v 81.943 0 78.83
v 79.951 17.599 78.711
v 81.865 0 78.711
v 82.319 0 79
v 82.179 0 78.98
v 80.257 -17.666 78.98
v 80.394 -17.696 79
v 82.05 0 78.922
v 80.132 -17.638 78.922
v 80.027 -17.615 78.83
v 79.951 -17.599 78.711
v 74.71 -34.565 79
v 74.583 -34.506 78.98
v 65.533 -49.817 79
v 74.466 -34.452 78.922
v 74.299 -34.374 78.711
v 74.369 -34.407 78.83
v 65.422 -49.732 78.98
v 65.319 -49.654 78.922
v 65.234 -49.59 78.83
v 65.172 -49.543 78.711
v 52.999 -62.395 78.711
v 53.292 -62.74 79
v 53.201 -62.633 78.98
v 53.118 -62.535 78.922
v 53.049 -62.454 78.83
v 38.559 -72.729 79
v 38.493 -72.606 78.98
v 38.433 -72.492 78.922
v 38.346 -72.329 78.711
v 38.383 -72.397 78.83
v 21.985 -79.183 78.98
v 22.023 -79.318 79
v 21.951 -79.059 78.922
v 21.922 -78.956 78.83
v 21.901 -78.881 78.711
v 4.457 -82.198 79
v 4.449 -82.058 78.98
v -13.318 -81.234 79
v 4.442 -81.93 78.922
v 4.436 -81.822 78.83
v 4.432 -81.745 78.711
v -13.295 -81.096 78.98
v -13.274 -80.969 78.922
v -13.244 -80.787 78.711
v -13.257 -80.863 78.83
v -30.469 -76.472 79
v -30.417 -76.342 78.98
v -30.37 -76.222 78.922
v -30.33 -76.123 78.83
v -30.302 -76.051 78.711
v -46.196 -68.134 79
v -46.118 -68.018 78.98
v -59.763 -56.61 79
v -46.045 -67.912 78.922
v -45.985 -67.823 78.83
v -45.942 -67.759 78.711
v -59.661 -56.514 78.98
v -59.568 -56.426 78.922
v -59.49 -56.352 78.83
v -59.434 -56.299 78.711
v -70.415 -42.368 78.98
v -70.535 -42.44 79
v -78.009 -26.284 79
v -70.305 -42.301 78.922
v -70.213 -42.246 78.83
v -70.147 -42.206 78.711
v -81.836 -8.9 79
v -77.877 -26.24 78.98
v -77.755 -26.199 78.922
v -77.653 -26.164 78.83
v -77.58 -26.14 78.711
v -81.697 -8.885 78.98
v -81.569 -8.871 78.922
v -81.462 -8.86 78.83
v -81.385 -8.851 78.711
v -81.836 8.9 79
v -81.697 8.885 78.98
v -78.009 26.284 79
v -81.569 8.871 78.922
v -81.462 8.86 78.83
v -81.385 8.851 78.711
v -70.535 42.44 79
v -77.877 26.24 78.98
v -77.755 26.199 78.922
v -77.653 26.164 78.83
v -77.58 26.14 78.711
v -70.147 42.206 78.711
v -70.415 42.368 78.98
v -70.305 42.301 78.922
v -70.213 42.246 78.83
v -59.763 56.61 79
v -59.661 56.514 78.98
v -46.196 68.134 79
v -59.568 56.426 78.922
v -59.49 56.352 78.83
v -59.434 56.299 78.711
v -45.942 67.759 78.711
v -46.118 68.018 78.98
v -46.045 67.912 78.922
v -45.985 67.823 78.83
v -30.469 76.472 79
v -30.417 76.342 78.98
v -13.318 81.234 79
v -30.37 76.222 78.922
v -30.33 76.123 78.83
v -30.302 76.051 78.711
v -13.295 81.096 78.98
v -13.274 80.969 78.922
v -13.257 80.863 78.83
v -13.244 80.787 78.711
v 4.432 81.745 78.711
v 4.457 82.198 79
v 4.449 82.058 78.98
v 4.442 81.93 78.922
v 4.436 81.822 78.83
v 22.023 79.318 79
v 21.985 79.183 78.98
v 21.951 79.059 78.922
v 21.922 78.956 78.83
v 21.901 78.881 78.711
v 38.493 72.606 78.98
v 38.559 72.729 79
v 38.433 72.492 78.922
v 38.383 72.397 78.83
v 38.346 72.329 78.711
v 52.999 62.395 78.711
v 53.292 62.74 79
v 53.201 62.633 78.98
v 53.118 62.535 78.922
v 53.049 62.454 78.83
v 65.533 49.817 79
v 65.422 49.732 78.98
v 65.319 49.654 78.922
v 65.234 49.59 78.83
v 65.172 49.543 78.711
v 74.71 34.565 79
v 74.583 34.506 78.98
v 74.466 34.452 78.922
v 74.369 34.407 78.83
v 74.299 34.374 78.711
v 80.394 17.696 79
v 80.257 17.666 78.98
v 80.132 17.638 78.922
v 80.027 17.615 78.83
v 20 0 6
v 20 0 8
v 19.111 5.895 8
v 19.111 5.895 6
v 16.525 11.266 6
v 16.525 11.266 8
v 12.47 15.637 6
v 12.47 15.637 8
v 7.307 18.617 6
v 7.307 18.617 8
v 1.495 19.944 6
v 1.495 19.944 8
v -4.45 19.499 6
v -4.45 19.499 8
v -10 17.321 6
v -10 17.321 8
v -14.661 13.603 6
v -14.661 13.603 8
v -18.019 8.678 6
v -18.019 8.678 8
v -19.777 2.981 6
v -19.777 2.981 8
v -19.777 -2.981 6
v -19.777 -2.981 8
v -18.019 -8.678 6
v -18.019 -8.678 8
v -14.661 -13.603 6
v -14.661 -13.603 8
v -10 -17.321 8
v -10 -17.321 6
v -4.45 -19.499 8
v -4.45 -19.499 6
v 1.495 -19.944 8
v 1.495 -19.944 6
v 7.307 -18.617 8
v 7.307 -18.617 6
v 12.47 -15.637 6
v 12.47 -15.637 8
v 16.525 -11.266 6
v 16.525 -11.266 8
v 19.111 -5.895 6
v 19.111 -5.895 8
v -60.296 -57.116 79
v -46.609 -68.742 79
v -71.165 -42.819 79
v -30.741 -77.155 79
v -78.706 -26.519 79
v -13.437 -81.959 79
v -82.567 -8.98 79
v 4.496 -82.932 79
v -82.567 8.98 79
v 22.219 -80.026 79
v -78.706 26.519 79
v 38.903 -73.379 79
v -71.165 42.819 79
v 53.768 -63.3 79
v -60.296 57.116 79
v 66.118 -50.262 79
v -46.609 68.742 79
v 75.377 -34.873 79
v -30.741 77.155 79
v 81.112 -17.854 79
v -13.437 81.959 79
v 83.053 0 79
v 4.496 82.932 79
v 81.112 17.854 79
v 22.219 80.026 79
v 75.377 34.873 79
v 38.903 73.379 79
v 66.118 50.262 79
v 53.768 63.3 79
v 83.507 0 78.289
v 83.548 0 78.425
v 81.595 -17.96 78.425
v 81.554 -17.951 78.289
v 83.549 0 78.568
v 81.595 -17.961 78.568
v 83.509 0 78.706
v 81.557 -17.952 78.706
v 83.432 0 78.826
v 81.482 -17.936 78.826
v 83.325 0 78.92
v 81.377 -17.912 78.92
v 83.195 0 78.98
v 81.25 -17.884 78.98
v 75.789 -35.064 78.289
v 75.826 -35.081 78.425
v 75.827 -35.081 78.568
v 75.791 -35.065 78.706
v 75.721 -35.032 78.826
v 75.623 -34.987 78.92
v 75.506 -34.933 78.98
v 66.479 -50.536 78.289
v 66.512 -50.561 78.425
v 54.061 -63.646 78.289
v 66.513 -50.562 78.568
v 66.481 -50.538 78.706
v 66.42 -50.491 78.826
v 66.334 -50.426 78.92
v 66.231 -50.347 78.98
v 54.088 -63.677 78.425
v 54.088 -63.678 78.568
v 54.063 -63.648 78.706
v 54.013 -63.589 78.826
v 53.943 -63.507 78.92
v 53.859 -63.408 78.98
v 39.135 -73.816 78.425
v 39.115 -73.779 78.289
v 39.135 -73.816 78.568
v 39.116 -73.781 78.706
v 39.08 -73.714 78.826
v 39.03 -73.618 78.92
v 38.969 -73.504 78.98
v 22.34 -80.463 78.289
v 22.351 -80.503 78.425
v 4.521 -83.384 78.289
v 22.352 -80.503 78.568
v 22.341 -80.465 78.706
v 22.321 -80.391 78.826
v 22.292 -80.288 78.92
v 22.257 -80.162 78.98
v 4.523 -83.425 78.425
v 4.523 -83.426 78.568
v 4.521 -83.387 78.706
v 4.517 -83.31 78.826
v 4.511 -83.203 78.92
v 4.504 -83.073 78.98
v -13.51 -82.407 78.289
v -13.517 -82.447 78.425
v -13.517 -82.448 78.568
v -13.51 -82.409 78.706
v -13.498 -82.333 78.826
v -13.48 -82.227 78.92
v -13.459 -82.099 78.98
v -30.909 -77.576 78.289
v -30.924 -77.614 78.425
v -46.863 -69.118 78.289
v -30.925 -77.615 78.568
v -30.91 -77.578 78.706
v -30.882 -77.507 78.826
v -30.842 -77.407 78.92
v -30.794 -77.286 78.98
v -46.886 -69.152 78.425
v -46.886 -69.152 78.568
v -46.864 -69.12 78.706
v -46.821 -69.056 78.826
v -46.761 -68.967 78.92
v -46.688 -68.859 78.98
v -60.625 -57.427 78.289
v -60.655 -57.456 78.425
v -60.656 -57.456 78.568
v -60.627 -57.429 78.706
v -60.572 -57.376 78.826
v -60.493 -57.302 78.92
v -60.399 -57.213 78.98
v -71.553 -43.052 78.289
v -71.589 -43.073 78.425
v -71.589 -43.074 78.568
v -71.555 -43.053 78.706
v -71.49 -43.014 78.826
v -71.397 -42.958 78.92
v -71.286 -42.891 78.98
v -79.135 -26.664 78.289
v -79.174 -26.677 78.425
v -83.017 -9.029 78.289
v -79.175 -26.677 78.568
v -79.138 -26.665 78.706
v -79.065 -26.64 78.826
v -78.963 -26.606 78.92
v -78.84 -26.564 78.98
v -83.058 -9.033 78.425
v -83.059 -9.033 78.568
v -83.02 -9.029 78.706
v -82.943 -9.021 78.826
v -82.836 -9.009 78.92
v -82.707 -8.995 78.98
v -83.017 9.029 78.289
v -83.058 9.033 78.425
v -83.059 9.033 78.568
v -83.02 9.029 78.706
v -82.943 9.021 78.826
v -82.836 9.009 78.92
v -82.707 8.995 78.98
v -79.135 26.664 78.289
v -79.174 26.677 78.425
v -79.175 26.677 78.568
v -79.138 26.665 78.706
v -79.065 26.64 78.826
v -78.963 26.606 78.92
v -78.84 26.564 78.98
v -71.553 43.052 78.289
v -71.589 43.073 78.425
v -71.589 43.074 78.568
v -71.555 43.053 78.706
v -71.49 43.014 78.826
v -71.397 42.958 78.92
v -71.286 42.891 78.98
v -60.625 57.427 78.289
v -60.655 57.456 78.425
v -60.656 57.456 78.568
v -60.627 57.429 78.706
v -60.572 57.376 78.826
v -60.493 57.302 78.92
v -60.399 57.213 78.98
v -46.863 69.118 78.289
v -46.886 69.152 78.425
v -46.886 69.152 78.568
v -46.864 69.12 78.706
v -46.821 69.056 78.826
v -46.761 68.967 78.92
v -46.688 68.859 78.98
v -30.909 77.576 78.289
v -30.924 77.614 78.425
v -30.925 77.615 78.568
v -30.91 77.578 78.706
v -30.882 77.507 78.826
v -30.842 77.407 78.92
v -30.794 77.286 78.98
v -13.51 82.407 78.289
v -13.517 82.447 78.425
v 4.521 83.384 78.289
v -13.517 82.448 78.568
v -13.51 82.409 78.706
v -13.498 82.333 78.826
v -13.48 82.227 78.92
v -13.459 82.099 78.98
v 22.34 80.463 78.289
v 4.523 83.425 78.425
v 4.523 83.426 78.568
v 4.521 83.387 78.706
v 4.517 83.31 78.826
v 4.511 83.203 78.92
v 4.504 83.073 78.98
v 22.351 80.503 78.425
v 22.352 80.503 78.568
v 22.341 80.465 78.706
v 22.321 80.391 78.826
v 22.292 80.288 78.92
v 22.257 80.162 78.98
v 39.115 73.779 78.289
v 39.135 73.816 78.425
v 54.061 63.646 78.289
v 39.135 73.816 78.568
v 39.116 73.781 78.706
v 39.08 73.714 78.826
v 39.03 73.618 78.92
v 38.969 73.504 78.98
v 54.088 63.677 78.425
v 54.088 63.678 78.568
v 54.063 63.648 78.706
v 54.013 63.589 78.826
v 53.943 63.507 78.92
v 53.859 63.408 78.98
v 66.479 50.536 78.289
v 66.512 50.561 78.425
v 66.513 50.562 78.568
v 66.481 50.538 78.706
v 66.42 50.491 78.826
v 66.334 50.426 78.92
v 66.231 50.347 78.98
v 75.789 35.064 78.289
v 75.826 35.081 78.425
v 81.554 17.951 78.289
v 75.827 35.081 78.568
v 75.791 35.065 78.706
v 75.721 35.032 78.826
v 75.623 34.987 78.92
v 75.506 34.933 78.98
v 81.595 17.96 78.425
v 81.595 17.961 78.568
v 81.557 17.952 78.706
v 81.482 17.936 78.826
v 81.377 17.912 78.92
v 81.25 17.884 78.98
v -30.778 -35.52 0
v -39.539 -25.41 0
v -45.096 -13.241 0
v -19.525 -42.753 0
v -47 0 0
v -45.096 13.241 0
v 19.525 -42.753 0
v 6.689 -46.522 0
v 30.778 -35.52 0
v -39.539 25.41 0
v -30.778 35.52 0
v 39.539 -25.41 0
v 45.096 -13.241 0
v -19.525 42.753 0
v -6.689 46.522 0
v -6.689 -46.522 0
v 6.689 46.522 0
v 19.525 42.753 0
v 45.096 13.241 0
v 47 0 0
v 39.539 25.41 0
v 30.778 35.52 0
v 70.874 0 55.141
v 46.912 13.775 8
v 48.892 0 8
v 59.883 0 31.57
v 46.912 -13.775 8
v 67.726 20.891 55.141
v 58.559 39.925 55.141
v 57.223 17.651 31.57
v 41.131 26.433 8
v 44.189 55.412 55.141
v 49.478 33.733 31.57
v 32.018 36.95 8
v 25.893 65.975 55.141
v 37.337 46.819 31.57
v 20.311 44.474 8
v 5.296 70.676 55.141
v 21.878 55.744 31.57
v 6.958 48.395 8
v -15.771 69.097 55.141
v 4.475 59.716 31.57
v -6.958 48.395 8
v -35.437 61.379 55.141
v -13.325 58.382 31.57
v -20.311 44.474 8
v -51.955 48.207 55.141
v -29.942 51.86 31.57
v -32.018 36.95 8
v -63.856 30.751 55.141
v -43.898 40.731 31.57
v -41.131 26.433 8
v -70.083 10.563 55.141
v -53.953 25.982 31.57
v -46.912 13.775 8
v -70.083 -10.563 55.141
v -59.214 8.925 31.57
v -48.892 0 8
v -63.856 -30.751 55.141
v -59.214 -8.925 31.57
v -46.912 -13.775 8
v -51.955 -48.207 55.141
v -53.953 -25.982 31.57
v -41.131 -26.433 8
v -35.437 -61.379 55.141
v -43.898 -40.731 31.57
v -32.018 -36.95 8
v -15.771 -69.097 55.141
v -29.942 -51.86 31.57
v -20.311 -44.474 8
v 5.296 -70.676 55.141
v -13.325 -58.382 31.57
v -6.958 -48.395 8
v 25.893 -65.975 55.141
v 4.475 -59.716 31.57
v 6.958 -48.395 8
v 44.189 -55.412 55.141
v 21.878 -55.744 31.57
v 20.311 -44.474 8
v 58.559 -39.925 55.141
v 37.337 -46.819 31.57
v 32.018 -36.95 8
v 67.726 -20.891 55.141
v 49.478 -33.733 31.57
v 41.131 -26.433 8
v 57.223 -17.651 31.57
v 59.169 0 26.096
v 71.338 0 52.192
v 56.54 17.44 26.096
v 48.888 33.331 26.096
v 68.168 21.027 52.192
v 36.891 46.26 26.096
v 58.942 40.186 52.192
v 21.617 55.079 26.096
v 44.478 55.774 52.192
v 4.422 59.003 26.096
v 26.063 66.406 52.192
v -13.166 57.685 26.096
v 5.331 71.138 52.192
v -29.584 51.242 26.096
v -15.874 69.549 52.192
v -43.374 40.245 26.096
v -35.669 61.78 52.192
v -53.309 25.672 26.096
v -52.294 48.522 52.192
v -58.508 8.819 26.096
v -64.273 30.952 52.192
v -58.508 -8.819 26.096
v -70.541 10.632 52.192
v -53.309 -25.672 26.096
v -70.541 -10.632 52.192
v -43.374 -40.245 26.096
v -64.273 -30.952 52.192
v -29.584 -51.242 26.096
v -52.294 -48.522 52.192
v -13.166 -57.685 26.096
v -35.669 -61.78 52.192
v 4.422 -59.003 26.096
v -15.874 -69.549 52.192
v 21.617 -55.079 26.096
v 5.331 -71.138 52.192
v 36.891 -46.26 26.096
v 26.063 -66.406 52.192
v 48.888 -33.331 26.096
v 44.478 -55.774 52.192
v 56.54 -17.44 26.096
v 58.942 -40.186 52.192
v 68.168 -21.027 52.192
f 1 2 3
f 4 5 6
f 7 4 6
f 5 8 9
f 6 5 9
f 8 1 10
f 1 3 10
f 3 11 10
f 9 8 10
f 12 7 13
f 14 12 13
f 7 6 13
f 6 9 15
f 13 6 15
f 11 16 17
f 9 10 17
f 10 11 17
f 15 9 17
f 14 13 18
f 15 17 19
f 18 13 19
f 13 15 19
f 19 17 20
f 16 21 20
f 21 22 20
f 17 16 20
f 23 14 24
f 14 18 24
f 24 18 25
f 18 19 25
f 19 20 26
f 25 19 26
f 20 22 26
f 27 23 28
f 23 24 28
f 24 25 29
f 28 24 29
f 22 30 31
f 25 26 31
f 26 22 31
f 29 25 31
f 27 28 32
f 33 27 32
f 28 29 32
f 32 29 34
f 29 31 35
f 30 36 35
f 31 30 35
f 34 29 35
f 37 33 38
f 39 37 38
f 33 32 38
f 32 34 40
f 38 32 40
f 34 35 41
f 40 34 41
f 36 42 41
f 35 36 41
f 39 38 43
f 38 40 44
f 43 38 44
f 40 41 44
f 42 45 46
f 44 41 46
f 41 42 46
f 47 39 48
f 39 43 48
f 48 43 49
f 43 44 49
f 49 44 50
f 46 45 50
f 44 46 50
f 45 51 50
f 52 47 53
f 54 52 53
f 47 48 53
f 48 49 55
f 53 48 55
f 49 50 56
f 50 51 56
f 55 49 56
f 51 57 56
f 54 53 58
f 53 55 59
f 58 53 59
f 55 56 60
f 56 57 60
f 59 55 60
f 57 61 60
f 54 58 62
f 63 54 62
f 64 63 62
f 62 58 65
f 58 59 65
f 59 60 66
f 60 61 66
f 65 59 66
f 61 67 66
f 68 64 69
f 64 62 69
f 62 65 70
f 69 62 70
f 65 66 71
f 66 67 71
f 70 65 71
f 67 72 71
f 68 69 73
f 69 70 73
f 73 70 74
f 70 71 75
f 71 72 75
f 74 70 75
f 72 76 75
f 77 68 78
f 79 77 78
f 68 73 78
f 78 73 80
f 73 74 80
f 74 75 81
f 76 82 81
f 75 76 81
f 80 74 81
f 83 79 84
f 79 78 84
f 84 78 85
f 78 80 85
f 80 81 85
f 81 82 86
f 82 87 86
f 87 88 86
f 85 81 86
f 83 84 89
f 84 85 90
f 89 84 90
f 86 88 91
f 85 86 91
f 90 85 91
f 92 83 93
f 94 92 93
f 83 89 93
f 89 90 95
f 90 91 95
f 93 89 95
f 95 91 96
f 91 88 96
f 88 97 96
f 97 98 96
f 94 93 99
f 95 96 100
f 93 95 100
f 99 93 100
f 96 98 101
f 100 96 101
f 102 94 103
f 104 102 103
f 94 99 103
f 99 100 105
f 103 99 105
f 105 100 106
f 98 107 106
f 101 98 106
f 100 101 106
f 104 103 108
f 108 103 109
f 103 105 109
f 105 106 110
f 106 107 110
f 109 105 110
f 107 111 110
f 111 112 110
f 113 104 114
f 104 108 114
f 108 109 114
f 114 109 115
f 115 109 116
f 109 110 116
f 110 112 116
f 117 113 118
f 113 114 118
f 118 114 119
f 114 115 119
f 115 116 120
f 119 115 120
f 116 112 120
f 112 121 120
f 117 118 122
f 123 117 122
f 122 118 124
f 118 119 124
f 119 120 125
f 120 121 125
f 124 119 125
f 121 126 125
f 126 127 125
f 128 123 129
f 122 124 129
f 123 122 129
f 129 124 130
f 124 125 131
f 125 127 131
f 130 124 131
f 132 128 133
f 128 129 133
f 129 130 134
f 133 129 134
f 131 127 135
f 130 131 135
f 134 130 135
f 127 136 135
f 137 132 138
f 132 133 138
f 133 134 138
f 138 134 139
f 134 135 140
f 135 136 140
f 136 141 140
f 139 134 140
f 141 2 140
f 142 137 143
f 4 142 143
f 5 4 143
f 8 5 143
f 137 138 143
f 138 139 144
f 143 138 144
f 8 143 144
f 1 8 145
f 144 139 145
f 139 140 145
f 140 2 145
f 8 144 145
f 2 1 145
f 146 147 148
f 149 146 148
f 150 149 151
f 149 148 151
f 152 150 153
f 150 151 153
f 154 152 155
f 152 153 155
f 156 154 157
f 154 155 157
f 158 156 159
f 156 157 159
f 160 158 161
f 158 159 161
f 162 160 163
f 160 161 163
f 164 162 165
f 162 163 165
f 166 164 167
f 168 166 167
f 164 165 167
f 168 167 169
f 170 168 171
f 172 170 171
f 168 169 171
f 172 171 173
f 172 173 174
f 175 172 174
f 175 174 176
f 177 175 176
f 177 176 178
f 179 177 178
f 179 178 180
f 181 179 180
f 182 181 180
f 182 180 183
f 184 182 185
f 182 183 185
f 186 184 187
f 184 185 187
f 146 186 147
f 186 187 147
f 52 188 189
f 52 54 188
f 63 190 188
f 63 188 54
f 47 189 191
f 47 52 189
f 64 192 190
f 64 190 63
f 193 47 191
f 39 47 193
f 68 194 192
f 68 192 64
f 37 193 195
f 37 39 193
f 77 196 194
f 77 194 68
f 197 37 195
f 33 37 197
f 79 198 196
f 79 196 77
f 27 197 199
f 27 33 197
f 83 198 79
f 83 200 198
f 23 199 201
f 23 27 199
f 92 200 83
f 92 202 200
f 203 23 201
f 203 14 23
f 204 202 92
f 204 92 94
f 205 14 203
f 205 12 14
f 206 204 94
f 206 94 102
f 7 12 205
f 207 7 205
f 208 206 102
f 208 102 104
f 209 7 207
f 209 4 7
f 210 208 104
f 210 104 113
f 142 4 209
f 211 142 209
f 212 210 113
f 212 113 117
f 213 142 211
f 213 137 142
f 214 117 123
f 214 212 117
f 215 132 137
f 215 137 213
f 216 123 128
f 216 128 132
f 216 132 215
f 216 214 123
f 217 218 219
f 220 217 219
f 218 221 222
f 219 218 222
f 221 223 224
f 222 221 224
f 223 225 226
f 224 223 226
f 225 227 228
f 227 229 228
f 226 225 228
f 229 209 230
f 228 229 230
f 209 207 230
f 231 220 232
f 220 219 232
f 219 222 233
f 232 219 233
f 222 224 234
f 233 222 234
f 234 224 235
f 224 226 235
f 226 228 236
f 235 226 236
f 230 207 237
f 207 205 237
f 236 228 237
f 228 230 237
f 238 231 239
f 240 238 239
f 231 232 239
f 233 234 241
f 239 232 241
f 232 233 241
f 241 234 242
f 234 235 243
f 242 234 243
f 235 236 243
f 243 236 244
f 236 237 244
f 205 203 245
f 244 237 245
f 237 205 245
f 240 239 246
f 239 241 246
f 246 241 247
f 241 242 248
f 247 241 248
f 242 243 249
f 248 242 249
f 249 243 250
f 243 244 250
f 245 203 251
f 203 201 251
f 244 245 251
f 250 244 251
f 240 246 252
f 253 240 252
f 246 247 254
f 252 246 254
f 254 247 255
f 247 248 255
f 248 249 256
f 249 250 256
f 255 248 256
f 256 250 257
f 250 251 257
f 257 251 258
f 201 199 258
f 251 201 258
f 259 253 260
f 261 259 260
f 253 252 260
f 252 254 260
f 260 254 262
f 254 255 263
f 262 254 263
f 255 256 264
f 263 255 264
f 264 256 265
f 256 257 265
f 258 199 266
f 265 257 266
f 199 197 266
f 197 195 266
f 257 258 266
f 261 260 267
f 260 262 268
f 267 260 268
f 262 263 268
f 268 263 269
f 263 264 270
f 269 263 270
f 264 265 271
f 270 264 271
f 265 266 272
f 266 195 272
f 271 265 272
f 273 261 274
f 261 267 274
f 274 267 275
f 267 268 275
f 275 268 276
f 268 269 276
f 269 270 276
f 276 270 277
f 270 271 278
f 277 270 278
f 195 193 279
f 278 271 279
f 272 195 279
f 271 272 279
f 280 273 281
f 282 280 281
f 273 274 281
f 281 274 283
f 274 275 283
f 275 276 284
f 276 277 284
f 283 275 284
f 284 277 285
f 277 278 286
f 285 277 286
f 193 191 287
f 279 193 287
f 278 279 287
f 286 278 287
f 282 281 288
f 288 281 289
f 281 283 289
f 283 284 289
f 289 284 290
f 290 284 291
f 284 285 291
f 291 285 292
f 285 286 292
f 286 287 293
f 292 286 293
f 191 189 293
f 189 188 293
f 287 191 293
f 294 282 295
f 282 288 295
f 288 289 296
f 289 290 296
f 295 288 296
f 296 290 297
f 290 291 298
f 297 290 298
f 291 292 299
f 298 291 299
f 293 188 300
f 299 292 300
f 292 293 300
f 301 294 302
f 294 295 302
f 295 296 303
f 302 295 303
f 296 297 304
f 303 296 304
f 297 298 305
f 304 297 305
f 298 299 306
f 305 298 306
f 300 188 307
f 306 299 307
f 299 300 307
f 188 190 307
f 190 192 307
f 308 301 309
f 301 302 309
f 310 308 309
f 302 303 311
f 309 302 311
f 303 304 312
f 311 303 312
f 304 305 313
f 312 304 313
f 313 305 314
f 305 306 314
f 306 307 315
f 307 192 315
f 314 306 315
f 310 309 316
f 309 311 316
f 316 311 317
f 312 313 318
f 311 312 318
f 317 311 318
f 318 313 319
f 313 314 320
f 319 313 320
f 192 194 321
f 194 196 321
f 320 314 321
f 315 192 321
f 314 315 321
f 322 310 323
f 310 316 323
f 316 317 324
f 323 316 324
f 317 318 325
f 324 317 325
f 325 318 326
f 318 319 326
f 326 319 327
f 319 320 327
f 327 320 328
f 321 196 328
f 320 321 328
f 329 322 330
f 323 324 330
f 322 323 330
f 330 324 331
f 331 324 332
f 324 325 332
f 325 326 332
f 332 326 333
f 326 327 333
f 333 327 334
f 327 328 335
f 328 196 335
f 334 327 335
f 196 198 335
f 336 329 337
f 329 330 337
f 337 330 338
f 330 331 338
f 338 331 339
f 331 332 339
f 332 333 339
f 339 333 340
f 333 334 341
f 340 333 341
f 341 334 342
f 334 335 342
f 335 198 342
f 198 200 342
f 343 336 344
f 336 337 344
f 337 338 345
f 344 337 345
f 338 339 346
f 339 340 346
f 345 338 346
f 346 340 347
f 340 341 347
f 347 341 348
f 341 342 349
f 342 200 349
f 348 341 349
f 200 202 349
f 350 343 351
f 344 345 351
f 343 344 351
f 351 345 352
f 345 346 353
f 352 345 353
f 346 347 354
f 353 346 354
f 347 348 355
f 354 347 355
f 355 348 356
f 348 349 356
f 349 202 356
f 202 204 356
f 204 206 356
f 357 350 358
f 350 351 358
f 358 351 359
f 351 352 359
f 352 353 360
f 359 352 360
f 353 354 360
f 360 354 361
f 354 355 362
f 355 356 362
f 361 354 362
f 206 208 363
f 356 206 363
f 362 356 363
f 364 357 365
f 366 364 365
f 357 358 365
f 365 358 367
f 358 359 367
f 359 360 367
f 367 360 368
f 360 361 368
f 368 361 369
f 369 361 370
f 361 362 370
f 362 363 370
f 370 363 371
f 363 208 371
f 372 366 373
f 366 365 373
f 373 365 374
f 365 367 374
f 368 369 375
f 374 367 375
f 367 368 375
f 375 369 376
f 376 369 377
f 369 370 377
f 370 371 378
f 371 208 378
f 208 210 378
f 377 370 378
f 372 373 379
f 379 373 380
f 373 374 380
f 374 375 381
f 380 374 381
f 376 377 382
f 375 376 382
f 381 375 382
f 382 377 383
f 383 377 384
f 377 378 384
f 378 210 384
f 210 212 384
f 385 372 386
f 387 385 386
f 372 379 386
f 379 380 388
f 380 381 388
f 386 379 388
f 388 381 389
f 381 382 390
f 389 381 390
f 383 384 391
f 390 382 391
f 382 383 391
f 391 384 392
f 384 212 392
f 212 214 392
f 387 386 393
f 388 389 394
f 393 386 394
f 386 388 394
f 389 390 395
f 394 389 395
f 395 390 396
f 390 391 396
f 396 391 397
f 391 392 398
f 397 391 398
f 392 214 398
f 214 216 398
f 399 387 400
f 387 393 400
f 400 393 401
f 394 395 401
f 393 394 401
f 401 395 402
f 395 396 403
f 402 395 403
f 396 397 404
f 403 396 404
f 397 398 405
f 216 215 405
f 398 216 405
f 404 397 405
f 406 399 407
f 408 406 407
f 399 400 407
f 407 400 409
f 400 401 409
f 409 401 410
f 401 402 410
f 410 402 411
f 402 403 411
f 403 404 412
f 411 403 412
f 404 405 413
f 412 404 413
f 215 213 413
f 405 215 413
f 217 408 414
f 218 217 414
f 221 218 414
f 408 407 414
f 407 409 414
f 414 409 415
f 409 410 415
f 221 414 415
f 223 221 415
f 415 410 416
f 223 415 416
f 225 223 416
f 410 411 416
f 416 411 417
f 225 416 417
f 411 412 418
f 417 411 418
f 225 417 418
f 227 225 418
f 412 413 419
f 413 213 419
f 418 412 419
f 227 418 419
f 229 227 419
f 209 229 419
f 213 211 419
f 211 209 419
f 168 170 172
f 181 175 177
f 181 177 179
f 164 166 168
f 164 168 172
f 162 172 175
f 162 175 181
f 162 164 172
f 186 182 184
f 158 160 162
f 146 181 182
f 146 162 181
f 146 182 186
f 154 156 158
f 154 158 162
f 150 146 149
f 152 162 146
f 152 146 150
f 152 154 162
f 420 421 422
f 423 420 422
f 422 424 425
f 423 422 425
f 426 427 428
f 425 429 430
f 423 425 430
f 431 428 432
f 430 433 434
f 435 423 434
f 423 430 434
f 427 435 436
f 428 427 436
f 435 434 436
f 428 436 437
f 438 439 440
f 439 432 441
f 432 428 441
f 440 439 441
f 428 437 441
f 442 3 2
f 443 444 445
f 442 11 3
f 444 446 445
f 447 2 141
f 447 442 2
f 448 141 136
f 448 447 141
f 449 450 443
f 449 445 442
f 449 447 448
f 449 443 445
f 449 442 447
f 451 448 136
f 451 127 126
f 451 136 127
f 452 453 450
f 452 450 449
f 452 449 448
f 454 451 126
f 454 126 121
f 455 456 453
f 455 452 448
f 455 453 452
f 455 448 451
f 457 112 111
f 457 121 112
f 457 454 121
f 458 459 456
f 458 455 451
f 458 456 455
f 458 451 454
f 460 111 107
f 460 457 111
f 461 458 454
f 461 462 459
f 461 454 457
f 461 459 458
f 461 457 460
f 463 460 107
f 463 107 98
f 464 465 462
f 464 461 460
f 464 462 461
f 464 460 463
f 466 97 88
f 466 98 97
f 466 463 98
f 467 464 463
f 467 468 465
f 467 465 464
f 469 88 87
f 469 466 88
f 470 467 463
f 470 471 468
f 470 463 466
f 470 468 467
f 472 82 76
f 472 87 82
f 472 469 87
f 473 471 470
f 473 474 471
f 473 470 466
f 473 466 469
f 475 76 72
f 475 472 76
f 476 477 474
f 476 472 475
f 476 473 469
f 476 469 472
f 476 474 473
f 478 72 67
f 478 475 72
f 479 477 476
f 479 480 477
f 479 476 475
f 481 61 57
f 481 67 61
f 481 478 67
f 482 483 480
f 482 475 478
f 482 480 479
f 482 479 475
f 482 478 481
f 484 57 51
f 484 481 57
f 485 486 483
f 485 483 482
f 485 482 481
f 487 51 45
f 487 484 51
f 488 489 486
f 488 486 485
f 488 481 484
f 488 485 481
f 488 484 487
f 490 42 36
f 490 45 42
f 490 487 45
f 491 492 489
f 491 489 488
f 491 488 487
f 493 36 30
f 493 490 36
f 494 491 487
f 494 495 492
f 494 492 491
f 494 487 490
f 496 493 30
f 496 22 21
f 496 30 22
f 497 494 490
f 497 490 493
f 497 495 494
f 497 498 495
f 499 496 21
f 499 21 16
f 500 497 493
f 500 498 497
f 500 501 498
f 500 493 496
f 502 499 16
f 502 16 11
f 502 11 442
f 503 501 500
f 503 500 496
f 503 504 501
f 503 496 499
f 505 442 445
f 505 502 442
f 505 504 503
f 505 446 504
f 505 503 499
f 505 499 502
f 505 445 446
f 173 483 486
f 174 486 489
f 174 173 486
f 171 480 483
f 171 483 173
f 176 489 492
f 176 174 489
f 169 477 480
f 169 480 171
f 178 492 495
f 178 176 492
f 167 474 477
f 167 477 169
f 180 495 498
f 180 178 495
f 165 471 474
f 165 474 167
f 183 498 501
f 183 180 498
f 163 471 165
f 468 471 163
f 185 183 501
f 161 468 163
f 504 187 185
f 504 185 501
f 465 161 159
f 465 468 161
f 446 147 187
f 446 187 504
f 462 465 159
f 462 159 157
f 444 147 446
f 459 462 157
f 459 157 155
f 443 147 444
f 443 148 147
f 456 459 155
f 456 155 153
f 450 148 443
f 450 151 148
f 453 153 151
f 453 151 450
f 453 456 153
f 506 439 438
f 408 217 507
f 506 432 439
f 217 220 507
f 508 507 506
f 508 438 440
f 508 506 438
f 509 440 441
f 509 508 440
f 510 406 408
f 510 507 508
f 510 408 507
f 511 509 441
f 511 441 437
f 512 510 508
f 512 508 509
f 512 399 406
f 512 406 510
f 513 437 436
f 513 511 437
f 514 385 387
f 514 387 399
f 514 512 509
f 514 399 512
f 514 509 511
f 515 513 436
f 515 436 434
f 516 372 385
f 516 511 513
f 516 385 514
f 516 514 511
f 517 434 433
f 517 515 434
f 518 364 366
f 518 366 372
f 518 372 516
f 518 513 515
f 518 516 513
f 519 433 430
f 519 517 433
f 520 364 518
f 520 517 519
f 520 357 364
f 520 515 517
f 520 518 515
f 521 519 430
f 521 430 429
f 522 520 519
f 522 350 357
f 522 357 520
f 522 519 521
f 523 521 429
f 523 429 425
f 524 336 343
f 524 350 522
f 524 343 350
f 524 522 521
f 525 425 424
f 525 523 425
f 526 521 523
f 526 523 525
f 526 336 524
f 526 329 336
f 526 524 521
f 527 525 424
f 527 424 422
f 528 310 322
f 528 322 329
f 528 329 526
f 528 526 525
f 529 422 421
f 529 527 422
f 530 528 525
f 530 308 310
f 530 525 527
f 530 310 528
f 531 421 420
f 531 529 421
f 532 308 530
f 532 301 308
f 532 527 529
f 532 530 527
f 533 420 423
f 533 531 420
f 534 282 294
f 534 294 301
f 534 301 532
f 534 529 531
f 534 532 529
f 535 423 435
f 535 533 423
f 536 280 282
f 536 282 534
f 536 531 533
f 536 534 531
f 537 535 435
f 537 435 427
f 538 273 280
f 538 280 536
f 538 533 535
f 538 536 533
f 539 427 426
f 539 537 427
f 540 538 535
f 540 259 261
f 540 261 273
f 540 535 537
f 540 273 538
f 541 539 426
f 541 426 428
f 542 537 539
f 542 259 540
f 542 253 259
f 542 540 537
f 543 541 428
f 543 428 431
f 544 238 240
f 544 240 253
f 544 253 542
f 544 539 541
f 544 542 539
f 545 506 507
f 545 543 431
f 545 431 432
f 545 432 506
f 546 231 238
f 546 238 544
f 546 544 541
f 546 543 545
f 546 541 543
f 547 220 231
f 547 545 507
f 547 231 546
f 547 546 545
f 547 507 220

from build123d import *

# Parameters (mm, degrees)
F0_R     = 47
F1_DEPTH = 79
F1_TAPER = -25
F2_R     = 82
F3_DEPTH = 71
F3_TAPER = 25
F4_R     = 20
F5_DEPTH = 2
F6_R     = 0.5


with BuildPart() as f1:
    # F0 (on Top) → F1 (new body)
    with BuildSketch(Plane.XY):
        Circle(F0_R)
    extrude(amount=F1_DEPTH, taper=F1_TAPER)

    # F2 (on face) → F3 (cut)
    with BuildSketch(Plane.XY.offset(79)):
        Circle(F2_R)
    extrude(amount=-F3_DEPTH, taper=F3_TAPER, mode=Mode.SUBTRACT)

    # F4 (on face) → F5 (cut)
    with BuildSketch(Plane.XY.offset(8)):
        Circle(F4_R)
    extrude(amount=-F5_DEPTH, mode=Mode.SUBTRACT)

    # F6
    f6_edges = [f1.edges().sort_by_distance(p)[0] for p in [
        (-83.838305, 0, 79),
        (-82, 0, 79),
    ]]
    fillet(f6_edges, radius=F6_R)


solid = f1.part
